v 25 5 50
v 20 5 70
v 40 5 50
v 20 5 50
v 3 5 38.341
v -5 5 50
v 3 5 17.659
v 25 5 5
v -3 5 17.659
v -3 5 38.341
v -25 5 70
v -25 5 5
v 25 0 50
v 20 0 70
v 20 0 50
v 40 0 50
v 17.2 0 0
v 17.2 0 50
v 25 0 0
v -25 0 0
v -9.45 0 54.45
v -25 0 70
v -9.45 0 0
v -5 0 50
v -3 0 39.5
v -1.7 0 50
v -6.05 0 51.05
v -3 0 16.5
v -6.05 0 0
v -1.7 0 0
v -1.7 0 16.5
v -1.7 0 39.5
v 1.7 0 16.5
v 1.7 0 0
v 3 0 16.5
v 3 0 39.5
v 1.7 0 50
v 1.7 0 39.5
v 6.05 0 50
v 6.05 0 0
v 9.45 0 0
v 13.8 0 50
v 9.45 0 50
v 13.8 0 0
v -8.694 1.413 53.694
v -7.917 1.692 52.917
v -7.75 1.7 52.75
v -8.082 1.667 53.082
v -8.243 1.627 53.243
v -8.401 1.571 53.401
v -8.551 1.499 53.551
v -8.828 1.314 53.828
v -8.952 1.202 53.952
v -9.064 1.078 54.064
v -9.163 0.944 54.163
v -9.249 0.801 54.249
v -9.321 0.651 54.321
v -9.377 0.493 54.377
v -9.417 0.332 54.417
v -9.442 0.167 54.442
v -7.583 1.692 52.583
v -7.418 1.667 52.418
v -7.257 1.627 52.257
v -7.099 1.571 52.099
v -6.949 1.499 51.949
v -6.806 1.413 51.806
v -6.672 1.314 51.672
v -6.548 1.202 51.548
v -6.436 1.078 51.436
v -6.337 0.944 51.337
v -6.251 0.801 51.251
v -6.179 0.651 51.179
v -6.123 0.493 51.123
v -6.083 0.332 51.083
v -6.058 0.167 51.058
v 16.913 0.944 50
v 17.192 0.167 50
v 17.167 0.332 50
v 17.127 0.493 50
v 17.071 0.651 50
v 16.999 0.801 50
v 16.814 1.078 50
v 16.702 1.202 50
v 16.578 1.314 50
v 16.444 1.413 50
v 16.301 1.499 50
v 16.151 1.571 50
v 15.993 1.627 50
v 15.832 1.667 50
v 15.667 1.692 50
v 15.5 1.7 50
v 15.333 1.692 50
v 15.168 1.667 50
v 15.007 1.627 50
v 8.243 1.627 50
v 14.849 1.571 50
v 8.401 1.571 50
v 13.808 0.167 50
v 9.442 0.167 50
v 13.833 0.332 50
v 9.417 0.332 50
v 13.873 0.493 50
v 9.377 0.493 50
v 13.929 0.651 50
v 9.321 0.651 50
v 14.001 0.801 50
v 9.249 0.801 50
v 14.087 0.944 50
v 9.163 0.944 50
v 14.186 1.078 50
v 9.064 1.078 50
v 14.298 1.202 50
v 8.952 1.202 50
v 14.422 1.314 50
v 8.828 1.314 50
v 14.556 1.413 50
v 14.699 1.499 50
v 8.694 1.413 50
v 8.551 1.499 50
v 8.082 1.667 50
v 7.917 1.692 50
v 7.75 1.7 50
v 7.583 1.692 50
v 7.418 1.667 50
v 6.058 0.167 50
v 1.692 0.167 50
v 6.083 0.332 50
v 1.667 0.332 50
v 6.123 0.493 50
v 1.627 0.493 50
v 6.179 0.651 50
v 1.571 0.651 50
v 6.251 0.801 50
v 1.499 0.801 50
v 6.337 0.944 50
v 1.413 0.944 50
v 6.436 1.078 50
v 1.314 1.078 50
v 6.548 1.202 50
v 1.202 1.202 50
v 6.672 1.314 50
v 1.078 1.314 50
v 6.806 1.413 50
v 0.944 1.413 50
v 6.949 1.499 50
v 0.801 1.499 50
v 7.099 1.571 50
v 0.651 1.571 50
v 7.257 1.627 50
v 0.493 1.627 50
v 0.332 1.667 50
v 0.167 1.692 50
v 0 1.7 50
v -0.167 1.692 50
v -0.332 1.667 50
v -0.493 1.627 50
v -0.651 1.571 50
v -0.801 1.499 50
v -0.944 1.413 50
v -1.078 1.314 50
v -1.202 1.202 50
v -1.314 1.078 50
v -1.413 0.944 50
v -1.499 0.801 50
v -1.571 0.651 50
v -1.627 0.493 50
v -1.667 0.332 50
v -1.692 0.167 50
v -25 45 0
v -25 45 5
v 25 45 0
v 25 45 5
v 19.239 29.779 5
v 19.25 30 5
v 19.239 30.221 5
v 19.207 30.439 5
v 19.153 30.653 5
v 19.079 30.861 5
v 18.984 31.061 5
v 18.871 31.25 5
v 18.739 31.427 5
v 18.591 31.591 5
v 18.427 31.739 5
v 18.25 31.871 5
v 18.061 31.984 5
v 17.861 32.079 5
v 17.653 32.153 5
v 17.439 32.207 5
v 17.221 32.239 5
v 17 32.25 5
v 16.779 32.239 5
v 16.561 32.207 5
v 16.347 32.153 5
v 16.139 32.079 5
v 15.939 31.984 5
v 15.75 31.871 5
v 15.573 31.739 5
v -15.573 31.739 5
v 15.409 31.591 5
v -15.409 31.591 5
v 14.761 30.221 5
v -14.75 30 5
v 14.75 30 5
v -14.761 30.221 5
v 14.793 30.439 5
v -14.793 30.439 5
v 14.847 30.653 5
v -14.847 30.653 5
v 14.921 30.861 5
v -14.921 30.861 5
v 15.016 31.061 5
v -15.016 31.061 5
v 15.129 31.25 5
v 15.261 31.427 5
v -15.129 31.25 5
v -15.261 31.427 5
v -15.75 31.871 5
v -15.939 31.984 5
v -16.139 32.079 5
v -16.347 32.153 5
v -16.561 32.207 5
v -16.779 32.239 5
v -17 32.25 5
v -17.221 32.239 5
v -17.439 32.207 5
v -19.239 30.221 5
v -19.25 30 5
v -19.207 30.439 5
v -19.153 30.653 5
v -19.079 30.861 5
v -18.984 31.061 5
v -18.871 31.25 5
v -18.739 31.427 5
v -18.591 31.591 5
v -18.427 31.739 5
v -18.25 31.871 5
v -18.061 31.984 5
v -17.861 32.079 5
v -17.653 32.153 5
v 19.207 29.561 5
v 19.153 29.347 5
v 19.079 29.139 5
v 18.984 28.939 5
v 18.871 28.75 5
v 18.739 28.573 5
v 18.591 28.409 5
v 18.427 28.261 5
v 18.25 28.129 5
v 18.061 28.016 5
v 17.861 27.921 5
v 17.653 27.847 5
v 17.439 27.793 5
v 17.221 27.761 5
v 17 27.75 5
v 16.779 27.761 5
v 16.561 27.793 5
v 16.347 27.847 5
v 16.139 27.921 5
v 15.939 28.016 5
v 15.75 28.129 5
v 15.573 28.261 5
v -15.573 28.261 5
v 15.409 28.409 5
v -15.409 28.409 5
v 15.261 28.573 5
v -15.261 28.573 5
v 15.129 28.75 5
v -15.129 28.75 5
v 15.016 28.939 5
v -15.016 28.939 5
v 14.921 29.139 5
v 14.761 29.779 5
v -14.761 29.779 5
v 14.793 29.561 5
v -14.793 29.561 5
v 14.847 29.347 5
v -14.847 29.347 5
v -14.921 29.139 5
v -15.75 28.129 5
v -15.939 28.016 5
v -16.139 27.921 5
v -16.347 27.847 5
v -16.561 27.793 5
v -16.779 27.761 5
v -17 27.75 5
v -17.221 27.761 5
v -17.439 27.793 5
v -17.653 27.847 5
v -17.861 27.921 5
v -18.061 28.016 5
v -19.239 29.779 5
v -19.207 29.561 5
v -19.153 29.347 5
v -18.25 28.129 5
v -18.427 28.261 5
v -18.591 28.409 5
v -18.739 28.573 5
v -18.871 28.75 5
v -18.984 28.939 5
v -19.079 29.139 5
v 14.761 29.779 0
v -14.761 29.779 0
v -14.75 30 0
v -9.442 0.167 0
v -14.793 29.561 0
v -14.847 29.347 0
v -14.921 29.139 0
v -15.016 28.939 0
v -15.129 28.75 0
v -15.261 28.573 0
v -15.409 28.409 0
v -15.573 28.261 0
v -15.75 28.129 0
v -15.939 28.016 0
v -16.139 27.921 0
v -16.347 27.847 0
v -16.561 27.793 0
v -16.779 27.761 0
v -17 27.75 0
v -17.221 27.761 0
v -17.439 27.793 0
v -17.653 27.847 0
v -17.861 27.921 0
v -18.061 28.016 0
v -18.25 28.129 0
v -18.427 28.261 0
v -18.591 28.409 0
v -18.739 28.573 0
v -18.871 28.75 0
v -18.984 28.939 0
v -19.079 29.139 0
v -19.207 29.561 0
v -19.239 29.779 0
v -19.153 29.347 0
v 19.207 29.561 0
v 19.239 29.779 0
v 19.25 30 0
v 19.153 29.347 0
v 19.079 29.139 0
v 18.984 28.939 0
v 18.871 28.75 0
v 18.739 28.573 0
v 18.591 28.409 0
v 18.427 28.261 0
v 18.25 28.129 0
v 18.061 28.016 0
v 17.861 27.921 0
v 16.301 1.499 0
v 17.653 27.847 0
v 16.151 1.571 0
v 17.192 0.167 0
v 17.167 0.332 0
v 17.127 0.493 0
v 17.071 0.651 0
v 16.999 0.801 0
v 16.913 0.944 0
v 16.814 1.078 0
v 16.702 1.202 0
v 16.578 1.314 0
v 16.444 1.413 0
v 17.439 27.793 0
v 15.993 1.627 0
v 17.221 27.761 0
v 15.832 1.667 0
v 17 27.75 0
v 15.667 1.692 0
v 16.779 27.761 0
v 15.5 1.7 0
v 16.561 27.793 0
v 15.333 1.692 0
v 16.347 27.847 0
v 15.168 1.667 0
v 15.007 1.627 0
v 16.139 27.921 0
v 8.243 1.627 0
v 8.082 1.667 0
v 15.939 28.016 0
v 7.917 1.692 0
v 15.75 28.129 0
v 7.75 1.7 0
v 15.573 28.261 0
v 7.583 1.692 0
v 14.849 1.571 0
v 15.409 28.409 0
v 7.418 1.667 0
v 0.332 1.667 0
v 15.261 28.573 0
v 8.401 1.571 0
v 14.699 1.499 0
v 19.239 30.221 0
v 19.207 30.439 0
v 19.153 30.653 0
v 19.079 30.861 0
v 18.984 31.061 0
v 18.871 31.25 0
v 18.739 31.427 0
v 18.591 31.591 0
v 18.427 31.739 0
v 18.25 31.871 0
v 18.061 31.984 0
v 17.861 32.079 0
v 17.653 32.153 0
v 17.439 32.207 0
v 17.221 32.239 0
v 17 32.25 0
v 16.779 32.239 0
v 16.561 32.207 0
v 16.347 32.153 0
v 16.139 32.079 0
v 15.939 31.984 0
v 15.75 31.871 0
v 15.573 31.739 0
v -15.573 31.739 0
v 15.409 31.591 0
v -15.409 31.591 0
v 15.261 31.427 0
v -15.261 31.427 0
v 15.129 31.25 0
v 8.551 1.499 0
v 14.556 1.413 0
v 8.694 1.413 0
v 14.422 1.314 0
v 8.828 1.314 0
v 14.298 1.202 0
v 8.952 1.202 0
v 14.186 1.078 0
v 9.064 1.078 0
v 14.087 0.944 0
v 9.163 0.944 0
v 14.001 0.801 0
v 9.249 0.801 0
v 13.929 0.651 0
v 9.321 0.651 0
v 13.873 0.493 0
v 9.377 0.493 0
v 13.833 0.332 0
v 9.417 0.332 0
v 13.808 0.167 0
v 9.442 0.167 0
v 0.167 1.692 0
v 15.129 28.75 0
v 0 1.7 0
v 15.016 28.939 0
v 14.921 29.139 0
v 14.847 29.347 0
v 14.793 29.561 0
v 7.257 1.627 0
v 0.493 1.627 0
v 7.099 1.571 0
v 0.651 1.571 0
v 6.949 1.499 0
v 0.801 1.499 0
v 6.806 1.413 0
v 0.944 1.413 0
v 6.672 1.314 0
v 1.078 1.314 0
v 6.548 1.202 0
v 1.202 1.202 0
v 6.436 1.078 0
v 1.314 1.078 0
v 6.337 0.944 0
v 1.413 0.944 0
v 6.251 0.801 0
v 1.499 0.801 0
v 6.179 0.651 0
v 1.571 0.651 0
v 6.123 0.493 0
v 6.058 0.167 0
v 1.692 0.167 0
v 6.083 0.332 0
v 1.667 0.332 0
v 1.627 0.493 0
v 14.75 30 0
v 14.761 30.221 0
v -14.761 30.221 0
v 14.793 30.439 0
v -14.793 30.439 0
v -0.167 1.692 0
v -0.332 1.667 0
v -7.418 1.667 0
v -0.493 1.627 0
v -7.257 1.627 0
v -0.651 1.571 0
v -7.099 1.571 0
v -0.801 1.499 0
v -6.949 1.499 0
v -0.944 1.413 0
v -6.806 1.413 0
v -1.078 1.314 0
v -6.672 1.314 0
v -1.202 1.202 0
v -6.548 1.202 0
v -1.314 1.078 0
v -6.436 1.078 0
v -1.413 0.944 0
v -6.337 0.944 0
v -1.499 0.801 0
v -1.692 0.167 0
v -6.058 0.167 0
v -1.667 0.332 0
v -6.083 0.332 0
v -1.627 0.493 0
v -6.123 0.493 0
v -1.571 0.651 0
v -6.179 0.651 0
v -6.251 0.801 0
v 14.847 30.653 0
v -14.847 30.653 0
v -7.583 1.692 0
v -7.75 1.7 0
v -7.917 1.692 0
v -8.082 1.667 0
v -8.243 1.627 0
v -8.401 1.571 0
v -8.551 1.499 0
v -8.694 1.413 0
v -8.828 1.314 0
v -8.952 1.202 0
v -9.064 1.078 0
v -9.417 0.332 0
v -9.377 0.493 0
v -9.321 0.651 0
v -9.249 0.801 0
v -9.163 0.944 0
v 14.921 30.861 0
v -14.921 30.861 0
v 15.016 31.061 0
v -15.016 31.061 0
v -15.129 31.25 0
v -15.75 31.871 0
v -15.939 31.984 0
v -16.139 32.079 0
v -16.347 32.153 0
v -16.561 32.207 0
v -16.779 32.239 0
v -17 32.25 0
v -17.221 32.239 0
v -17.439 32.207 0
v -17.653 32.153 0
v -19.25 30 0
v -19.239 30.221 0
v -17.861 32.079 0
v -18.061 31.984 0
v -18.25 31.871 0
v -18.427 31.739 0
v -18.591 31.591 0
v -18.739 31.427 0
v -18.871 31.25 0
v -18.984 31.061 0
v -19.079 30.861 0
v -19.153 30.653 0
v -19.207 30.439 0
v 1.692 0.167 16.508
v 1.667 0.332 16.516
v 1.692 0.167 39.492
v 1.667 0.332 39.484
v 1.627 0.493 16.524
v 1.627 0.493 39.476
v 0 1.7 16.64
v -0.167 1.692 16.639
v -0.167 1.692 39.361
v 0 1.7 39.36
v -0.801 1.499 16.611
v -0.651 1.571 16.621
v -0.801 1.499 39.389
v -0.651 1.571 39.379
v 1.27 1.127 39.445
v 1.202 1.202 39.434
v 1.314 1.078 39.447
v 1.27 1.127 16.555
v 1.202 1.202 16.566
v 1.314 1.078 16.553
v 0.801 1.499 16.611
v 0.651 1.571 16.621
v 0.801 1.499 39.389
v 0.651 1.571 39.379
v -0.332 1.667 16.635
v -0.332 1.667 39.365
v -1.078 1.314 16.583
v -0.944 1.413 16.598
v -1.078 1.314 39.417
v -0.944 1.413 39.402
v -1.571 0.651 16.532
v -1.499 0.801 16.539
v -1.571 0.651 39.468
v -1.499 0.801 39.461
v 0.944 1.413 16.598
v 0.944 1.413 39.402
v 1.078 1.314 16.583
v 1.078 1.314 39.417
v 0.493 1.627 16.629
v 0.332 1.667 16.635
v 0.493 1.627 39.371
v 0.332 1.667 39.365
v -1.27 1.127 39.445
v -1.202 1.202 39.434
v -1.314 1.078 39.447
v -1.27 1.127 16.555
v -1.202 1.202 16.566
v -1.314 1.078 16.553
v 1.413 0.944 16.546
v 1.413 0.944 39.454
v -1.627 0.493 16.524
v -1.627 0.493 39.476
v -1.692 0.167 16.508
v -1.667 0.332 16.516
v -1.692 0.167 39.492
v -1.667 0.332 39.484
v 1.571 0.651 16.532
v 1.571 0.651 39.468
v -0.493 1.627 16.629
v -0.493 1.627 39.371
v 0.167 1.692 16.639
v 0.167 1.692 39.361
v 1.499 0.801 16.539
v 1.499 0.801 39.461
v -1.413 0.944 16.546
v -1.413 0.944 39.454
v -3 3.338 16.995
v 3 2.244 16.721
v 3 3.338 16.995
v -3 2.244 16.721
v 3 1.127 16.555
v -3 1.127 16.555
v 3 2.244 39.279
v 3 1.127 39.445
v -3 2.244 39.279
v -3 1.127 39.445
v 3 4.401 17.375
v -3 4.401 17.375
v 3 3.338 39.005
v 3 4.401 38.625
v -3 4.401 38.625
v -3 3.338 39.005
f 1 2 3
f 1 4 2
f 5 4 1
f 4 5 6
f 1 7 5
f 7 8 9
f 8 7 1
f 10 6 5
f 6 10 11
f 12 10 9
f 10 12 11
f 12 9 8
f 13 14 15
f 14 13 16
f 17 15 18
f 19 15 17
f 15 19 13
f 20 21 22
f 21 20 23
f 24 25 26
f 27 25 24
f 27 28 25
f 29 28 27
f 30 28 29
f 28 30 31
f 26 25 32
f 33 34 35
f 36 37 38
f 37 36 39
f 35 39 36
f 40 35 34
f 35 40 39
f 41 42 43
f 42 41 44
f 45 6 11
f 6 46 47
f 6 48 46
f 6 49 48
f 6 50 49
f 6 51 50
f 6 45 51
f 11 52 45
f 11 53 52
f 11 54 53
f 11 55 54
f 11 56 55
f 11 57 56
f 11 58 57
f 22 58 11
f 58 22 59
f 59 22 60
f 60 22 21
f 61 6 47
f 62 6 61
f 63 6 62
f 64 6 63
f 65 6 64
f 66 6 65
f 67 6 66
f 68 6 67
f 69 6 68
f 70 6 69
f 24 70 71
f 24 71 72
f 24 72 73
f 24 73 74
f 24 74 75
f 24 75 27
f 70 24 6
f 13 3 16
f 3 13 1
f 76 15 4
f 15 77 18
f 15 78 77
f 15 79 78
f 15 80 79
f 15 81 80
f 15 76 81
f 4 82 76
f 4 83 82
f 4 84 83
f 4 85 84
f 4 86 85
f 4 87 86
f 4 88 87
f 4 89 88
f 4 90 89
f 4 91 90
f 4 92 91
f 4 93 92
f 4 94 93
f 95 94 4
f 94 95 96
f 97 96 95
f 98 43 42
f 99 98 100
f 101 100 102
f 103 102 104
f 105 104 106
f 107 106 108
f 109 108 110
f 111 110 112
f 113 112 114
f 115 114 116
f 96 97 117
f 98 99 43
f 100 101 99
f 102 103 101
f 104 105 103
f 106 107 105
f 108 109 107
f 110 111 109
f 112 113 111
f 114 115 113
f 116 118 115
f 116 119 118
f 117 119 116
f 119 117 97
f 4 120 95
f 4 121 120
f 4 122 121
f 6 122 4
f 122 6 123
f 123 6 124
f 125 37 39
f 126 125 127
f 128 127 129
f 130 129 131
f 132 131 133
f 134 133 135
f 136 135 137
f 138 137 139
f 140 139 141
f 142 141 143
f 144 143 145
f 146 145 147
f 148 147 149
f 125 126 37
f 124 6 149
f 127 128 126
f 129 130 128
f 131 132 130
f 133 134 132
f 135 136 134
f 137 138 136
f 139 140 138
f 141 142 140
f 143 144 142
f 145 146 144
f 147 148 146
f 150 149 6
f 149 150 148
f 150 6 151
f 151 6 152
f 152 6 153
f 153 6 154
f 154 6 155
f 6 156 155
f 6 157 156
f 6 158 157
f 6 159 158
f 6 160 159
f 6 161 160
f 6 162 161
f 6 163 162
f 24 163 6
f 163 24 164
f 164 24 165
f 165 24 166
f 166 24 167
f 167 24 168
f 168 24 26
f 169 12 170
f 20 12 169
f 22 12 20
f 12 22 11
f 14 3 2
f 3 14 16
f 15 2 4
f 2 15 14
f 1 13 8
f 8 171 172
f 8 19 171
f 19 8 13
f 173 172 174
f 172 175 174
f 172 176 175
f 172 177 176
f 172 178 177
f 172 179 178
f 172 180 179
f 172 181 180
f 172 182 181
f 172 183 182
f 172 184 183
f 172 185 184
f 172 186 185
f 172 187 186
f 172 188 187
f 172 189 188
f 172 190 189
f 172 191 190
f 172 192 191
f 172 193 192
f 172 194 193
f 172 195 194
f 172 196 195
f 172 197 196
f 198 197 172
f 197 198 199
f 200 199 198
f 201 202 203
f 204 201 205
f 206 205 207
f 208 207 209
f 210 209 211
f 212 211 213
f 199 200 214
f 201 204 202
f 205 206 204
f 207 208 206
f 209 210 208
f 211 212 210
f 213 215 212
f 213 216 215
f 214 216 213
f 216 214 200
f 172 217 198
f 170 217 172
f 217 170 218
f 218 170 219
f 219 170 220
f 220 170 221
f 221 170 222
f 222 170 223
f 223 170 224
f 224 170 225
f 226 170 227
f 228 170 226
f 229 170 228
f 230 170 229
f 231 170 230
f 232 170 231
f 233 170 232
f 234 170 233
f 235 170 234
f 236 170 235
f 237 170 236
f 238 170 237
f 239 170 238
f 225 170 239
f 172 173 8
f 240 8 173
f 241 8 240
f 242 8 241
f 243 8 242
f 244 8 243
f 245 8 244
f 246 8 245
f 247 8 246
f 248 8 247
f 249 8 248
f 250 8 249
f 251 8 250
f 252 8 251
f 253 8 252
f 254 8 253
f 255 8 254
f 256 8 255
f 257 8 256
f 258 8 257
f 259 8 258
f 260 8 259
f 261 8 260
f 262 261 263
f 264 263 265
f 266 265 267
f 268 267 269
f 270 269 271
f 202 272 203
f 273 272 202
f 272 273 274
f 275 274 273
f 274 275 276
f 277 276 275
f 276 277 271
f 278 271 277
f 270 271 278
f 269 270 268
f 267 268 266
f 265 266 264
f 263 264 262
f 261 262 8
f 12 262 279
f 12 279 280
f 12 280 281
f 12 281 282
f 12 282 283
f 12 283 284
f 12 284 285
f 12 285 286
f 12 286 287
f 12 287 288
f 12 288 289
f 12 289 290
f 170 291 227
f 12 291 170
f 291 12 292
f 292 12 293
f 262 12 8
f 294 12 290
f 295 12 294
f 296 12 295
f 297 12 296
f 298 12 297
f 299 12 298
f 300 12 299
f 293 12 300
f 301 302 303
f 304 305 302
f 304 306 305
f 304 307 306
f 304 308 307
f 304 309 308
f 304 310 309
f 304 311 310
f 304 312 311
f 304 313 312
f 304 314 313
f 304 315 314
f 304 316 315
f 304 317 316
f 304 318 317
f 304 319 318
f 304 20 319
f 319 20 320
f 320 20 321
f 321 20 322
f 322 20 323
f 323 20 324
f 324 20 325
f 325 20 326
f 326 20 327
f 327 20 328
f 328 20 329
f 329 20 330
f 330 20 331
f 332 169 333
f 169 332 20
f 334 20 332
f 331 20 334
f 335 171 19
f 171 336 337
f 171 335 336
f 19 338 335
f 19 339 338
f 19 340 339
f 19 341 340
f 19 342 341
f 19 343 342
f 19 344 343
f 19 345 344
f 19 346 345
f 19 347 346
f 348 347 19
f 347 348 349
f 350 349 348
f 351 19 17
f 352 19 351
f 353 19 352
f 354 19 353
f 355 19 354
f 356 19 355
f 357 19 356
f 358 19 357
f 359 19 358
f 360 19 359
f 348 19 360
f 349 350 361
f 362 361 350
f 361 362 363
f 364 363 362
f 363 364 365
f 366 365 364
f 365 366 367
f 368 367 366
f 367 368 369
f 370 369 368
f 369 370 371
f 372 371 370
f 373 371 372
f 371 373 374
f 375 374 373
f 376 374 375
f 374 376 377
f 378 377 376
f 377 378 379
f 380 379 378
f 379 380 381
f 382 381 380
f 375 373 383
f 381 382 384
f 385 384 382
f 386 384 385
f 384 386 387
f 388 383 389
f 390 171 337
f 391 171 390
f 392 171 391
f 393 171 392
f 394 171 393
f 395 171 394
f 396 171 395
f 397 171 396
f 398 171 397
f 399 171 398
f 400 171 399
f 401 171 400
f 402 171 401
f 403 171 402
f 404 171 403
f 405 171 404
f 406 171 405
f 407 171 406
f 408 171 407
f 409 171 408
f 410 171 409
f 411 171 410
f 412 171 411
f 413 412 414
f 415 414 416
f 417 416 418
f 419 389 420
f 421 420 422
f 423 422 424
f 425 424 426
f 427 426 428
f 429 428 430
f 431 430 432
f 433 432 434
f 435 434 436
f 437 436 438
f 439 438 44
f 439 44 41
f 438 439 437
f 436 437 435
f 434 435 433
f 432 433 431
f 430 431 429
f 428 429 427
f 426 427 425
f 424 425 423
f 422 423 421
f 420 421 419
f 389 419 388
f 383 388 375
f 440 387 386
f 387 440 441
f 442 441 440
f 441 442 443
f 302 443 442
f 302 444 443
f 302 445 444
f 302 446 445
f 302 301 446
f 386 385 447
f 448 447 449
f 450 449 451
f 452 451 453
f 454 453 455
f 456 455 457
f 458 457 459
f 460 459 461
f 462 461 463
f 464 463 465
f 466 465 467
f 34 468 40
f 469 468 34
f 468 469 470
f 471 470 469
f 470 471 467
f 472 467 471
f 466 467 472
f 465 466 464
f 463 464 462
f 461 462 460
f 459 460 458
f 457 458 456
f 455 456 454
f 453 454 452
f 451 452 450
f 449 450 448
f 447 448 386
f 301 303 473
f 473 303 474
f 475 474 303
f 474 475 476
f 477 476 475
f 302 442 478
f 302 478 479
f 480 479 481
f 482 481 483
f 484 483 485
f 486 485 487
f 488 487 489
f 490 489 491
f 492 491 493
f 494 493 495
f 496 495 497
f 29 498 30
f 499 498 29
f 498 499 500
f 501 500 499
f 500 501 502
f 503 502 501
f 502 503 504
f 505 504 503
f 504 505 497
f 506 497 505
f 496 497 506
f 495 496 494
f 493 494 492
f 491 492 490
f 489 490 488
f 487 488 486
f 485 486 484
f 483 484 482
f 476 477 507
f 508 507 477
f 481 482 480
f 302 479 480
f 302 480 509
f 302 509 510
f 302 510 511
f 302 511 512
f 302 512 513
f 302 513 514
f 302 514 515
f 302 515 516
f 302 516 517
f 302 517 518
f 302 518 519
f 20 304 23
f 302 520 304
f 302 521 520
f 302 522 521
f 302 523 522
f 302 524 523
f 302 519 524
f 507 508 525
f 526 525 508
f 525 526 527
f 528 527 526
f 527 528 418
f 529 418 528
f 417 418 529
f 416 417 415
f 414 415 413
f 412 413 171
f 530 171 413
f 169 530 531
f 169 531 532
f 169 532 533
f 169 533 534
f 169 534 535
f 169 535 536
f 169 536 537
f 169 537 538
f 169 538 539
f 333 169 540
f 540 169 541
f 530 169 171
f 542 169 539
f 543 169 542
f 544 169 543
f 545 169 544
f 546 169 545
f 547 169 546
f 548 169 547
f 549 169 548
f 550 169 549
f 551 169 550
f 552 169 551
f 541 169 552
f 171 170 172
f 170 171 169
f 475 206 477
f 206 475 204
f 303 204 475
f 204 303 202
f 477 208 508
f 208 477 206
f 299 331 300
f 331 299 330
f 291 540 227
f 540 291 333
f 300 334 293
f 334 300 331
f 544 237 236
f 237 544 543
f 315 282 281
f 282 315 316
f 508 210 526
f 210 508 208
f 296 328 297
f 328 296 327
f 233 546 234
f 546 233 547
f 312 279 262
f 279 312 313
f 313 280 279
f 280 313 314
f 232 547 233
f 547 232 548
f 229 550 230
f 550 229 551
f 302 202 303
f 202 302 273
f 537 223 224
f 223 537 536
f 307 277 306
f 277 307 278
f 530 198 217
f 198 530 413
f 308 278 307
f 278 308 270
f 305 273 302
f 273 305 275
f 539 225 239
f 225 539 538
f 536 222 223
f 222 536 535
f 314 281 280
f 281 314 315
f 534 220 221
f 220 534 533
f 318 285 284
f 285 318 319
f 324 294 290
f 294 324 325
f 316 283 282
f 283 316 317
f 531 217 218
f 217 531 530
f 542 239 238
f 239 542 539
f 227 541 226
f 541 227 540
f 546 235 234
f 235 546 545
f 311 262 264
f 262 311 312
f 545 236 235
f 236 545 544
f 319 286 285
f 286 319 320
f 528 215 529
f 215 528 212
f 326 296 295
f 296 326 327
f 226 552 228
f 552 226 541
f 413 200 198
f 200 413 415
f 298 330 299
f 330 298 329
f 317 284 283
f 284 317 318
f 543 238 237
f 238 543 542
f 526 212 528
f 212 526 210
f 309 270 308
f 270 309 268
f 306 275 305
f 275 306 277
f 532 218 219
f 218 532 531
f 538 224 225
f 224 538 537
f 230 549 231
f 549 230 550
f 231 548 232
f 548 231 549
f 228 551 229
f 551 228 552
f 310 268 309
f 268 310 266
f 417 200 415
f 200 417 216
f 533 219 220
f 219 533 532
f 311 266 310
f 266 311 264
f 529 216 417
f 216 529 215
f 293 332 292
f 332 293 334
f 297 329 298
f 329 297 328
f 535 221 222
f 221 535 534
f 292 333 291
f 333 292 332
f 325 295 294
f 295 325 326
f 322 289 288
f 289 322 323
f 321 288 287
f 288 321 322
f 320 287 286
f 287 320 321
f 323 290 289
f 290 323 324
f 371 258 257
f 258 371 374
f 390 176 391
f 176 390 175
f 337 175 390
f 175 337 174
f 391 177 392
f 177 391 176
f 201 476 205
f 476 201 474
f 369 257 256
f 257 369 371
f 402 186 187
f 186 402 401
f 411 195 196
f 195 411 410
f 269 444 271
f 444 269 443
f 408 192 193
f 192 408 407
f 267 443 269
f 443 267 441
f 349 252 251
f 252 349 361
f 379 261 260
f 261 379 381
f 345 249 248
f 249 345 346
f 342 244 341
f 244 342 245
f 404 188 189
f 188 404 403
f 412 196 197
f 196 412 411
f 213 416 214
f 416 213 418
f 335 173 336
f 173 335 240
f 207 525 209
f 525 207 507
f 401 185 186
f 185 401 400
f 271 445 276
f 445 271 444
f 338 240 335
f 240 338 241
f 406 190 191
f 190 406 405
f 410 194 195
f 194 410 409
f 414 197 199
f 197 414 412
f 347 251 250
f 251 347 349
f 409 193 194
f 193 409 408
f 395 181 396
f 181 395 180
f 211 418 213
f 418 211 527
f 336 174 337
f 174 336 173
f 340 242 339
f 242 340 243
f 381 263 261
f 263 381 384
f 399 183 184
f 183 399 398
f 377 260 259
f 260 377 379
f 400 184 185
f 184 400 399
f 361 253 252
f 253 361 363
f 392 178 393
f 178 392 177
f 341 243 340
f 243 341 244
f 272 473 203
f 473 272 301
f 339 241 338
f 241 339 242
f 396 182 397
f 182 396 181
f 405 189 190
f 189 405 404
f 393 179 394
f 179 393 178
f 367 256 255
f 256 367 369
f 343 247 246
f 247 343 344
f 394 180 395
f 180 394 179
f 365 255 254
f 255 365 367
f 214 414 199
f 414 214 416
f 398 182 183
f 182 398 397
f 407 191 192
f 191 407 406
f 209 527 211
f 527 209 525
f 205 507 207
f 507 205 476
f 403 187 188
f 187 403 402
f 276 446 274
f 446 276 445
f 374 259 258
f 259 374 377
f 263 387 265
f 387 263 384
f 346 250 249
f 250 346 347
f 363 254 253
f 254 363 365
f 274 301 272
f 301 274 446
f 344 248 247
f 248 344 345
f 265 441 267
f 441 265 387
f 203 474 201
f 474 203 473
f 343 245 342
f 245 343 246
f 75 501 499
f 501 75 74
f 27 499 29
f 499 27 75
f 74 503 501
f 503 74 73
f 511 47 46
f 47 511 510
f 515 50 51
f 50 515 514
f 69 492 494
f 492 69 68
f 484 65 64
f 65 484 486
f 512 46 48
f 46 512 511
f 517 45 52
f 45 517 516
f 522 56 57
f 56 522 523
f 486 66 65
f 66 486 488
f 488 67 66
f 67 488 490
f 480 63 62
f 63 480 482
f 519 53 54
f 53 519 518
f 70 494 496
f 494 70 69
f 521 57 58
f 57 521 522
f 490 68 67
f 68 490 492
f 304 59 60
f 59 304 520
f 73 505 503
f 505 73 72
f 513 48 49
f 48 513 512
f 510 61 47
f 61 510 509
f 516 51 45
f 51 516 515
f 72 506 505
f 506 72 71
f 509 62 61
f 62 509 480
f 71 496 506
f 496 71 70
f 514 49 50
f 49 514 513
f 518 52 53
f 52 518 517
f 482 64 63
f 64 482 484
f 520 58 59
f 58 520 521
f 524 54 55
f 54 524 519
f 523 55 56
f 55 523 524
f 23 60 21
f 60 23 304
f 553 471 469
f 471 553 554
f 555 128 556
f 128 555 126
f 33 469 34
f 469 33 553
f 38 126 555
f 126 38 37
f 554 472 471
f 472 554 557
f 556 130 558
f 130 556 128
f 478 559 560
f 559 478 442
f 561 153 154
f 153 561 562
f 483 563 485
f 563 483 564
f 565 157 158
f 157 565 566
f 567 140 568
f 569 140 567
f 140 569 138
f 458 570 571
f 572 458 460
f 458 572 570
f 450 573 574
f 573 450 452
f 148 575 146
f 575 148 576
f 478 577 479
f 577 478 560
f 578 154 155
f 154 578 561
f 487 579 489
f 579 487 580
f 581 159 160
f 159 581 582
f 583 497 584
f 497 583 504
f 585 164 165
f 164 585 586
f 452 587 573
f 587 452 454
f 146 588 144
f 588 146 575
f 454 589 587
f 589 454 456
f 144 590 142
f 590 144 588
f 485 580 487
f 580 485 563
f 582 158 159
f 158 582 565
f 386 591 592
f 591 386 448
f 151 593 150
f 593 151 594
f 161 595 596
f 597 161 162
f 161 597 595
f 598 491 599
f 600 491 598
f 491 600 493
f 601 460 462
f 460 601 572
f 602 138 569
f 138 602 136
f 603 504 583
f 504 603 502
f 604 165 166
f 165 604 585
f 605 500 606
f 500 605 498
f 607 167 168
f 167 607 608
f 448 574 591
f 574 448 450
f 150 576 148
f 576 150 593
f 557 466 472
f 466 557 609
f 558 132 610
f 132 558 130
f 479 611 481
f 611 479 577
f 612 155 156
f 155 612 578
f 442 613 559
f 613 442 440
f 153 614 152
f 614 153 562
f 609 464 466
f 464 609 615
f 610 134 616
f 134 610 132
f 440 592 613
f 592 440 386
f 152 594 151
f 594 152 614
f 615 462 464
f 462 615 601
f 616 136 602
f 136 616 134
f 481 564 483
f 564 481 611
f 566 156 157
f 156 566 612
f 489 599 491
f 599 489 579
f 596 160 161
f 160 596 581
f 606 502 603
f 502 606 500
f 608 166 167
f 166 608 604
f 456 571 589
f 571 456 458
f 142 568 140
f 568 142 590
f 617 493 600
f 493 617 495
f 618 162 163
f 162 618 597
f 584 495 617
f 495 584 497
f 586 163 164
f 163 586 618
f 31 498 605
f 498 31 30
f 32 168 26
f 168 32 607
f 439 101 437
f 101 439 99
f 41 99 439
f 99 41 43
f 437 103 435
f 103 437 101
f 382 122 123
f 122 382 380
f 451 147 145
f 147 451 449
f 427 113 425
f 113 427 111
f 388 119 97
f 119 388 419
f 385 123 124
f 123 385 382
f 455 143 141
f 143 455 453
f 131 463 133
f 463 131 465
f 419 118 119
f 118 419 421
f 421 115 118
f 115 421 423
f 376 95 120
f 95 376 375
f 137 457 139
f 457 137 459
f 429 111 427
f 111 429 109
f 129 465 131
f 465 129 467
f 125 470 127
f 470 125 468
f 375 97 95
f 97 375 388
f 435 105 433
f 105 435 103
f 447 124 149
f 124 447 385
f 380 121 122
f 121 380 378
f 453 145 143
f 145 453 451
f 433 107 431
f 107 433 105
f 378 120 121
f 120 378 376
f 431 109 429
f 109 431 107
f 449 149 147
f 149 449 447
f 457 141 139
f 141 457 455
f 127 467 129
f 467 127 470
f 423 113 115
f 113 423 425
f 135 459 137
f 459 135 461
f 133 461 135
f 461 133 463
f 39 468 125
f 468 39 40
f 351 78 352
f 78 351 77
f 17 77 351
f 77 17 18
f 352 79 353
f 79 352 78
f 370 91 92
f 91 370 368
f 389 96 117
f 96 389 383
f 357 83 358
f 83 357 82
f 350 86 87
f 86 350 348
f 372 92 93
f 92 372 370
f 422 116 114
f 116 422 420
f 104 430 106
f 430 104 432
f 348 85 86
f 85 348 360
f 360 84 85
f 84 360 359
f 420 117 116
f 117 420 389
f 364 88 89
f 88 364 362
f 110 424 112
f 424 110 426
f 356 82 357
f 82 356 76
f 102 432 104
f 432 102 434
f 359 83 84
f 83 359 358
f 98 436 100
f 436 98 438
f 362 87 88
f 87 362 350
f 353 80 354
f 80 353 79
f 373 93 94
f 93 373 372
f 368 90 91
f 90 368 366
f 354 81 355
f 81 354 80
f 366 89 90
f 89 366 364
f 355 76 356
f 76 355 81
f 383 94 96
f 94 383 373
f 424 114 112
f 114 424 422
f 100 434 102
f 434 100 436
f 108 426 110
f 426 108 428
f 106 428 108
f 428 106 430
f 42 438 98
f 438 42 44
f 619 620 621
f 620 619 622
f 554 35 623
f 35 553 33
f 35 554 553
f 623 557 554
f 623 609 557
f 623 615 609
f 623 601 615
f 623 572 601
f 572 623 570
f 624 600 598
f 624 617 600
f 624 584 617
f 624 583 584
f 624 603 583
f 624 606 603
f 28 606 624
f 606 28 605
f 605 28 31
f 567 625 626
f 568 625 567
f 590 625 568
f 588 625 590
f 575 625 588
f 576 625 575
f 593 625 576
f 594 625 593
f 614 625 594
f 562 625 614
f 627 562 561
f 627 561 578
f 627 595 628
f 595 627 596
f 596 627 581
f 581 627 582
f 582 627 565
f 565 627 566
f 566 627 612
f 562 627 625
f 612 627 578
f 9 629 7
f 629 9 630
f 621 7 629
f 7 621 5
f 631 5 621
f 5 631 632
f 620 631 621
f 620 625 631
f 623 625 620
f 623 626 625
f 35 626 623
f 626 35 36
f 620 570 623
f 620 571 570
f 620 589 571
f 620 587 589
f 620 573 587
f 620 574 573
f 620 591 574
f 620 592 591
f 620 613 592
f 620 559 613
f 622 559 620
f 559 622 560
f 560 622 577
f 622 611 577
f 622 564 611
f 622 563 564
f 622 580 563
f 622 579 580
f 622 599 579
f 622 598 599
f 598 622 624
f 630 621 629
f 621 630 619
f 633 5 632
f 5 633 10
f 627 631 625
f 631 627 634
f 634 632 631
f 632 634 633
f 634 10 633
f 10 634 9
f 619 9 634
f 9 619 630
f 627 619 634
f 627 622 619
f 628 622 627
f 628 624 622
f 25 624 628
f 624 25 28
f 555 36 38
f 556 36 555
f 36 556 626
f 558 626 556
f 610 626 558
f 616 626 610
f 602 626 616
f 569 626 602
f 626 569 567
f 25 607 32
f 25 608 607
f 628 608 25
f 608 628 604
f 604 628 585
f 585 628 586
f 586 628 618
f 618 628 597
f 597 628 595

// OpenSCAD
// L-shaped mounting bracket for NEMA 17 stepper motor (e.g. syringe pump)
// Print orientation: base plate on the bed, motor plate building upward (+Z)

$fn = 64;

// ---------------- Dimensions (mm) ----------------
base_x0      = -25;   // base plate: x from -25 to 25
base_x1      = 25;
base_y0      = 0;     // base plate: y from 0 to 45
base_y1      = 45;
base_z0      = 0;     // base plate: z from 0 to 5
base_z1      = 5;

hole_m4_x1   = -17;   // M4 through-hole in base plate (x)
hole_m4_y1   = 30;    // M4 through-hole in base plate (y)
hole_m4_d    = 4.5;   // M4 hole diameter

hole_m4_x2   = 17;    // M4 through-hole in base plate (x)
hole_m4_y2   = 30;    // M4 through-hole in base plate (y)

motor_x0     = -25;   // motor plate: x from -25 to 25
motor_x1     = 25;
motor_y0     = 0;     // motor plate: y from 0 to 5
motor_y1     = 5;
motor_z0     = 0;     // motor plate: z from 0 to 50
motor_z1     = 50;

boss_hole_d  = 23;    // motor centring boss hole diameter
boss_hole_x  = 0;     // boss hole centre x
boss_hole_z  = 28;    // boss hole centre z

screw_d      = 3.4;   // M3 screw hole diameter
screw_pitch  = 31;    // square pattern side length for screws
screw_count  = 4;     // number of screw holes

gusset_t     = 5;     // gusset thickness (X direction)
gusset_leg   = 20;    // right triangle leg length (along +Y and +Z)
gusset_x0    = -25;   // left gusset start x
gusset_x1    = -20;   // left gusset end x
gusset_x2    = 20;    // right gusset start x
gusset_x3    = 25;    // right gusset end x

eps          = 0.5;   // cutter overshoot past faces

// ---------------- Model ----------------
difference() {
    union() {
        // Base plate
        translate([base_x0, base_y0, base_z0])
            cube([base_x1 - base_x0, base_y1 - base_y0, base_z1 - base_z0]);

        // Vertical motor plate, standing on the back edge of the base
        translate([motor_x0, motor_y0, motor_z0])
            cube([motor_x1 - motor_x0, motor_y1 - motor_y0, motor_z1 - motor_z0]);

        // Triangular gussets, flush with left and right edges
        for (gx = [gusset_x0, gusset_x2]) {
            translate([gx, motor_y1, motor_z1])
                rotate([90, 0, 0])
                    linear_extrude(height = gusset_t)
                        polygon(points = [
                            [0, 0],
                            [gusset_leg, 0],
                            [0, gusset_leg]
                        ]);
        }
    }

    // Base plate through-holes for M4 screws
    for (hx = [hole_m4_x1, hole_m4_x2]) {
        for (hy = [hole_m4_y1, hole_m4_y2]) {
            translate([hx, hy, -eps])
                cylinder(d = hole_m4_d, h = base_z1 + 2 * eps);
        }
    }

    // Motor plate hole for motor centring boss (along Y)
    translate([boss_hole_x, 0, boss_hole_z])
        rotate([0, 90, 0])
            cylinder(d = boss_hole_d, h = motor_y1 + 2 * eps, center = true);

    // M3 screw holes on a square pattern, centred on the boss hole
    for (i = [0 : screw_count - 1]) {
        for (j = [0 : screw_count - 1]) {
            x = -screw_pitch / 2 + (i + 1) * screw_pitch / screw_count;
            z = -screw_pitch / 2 + (j + 1) * screw_pitch / screw_count;
            translate([x, 0, z])
                cylinder(d = screw_d, h = motor_z1 + 2 * eps);
        }
    }
}
